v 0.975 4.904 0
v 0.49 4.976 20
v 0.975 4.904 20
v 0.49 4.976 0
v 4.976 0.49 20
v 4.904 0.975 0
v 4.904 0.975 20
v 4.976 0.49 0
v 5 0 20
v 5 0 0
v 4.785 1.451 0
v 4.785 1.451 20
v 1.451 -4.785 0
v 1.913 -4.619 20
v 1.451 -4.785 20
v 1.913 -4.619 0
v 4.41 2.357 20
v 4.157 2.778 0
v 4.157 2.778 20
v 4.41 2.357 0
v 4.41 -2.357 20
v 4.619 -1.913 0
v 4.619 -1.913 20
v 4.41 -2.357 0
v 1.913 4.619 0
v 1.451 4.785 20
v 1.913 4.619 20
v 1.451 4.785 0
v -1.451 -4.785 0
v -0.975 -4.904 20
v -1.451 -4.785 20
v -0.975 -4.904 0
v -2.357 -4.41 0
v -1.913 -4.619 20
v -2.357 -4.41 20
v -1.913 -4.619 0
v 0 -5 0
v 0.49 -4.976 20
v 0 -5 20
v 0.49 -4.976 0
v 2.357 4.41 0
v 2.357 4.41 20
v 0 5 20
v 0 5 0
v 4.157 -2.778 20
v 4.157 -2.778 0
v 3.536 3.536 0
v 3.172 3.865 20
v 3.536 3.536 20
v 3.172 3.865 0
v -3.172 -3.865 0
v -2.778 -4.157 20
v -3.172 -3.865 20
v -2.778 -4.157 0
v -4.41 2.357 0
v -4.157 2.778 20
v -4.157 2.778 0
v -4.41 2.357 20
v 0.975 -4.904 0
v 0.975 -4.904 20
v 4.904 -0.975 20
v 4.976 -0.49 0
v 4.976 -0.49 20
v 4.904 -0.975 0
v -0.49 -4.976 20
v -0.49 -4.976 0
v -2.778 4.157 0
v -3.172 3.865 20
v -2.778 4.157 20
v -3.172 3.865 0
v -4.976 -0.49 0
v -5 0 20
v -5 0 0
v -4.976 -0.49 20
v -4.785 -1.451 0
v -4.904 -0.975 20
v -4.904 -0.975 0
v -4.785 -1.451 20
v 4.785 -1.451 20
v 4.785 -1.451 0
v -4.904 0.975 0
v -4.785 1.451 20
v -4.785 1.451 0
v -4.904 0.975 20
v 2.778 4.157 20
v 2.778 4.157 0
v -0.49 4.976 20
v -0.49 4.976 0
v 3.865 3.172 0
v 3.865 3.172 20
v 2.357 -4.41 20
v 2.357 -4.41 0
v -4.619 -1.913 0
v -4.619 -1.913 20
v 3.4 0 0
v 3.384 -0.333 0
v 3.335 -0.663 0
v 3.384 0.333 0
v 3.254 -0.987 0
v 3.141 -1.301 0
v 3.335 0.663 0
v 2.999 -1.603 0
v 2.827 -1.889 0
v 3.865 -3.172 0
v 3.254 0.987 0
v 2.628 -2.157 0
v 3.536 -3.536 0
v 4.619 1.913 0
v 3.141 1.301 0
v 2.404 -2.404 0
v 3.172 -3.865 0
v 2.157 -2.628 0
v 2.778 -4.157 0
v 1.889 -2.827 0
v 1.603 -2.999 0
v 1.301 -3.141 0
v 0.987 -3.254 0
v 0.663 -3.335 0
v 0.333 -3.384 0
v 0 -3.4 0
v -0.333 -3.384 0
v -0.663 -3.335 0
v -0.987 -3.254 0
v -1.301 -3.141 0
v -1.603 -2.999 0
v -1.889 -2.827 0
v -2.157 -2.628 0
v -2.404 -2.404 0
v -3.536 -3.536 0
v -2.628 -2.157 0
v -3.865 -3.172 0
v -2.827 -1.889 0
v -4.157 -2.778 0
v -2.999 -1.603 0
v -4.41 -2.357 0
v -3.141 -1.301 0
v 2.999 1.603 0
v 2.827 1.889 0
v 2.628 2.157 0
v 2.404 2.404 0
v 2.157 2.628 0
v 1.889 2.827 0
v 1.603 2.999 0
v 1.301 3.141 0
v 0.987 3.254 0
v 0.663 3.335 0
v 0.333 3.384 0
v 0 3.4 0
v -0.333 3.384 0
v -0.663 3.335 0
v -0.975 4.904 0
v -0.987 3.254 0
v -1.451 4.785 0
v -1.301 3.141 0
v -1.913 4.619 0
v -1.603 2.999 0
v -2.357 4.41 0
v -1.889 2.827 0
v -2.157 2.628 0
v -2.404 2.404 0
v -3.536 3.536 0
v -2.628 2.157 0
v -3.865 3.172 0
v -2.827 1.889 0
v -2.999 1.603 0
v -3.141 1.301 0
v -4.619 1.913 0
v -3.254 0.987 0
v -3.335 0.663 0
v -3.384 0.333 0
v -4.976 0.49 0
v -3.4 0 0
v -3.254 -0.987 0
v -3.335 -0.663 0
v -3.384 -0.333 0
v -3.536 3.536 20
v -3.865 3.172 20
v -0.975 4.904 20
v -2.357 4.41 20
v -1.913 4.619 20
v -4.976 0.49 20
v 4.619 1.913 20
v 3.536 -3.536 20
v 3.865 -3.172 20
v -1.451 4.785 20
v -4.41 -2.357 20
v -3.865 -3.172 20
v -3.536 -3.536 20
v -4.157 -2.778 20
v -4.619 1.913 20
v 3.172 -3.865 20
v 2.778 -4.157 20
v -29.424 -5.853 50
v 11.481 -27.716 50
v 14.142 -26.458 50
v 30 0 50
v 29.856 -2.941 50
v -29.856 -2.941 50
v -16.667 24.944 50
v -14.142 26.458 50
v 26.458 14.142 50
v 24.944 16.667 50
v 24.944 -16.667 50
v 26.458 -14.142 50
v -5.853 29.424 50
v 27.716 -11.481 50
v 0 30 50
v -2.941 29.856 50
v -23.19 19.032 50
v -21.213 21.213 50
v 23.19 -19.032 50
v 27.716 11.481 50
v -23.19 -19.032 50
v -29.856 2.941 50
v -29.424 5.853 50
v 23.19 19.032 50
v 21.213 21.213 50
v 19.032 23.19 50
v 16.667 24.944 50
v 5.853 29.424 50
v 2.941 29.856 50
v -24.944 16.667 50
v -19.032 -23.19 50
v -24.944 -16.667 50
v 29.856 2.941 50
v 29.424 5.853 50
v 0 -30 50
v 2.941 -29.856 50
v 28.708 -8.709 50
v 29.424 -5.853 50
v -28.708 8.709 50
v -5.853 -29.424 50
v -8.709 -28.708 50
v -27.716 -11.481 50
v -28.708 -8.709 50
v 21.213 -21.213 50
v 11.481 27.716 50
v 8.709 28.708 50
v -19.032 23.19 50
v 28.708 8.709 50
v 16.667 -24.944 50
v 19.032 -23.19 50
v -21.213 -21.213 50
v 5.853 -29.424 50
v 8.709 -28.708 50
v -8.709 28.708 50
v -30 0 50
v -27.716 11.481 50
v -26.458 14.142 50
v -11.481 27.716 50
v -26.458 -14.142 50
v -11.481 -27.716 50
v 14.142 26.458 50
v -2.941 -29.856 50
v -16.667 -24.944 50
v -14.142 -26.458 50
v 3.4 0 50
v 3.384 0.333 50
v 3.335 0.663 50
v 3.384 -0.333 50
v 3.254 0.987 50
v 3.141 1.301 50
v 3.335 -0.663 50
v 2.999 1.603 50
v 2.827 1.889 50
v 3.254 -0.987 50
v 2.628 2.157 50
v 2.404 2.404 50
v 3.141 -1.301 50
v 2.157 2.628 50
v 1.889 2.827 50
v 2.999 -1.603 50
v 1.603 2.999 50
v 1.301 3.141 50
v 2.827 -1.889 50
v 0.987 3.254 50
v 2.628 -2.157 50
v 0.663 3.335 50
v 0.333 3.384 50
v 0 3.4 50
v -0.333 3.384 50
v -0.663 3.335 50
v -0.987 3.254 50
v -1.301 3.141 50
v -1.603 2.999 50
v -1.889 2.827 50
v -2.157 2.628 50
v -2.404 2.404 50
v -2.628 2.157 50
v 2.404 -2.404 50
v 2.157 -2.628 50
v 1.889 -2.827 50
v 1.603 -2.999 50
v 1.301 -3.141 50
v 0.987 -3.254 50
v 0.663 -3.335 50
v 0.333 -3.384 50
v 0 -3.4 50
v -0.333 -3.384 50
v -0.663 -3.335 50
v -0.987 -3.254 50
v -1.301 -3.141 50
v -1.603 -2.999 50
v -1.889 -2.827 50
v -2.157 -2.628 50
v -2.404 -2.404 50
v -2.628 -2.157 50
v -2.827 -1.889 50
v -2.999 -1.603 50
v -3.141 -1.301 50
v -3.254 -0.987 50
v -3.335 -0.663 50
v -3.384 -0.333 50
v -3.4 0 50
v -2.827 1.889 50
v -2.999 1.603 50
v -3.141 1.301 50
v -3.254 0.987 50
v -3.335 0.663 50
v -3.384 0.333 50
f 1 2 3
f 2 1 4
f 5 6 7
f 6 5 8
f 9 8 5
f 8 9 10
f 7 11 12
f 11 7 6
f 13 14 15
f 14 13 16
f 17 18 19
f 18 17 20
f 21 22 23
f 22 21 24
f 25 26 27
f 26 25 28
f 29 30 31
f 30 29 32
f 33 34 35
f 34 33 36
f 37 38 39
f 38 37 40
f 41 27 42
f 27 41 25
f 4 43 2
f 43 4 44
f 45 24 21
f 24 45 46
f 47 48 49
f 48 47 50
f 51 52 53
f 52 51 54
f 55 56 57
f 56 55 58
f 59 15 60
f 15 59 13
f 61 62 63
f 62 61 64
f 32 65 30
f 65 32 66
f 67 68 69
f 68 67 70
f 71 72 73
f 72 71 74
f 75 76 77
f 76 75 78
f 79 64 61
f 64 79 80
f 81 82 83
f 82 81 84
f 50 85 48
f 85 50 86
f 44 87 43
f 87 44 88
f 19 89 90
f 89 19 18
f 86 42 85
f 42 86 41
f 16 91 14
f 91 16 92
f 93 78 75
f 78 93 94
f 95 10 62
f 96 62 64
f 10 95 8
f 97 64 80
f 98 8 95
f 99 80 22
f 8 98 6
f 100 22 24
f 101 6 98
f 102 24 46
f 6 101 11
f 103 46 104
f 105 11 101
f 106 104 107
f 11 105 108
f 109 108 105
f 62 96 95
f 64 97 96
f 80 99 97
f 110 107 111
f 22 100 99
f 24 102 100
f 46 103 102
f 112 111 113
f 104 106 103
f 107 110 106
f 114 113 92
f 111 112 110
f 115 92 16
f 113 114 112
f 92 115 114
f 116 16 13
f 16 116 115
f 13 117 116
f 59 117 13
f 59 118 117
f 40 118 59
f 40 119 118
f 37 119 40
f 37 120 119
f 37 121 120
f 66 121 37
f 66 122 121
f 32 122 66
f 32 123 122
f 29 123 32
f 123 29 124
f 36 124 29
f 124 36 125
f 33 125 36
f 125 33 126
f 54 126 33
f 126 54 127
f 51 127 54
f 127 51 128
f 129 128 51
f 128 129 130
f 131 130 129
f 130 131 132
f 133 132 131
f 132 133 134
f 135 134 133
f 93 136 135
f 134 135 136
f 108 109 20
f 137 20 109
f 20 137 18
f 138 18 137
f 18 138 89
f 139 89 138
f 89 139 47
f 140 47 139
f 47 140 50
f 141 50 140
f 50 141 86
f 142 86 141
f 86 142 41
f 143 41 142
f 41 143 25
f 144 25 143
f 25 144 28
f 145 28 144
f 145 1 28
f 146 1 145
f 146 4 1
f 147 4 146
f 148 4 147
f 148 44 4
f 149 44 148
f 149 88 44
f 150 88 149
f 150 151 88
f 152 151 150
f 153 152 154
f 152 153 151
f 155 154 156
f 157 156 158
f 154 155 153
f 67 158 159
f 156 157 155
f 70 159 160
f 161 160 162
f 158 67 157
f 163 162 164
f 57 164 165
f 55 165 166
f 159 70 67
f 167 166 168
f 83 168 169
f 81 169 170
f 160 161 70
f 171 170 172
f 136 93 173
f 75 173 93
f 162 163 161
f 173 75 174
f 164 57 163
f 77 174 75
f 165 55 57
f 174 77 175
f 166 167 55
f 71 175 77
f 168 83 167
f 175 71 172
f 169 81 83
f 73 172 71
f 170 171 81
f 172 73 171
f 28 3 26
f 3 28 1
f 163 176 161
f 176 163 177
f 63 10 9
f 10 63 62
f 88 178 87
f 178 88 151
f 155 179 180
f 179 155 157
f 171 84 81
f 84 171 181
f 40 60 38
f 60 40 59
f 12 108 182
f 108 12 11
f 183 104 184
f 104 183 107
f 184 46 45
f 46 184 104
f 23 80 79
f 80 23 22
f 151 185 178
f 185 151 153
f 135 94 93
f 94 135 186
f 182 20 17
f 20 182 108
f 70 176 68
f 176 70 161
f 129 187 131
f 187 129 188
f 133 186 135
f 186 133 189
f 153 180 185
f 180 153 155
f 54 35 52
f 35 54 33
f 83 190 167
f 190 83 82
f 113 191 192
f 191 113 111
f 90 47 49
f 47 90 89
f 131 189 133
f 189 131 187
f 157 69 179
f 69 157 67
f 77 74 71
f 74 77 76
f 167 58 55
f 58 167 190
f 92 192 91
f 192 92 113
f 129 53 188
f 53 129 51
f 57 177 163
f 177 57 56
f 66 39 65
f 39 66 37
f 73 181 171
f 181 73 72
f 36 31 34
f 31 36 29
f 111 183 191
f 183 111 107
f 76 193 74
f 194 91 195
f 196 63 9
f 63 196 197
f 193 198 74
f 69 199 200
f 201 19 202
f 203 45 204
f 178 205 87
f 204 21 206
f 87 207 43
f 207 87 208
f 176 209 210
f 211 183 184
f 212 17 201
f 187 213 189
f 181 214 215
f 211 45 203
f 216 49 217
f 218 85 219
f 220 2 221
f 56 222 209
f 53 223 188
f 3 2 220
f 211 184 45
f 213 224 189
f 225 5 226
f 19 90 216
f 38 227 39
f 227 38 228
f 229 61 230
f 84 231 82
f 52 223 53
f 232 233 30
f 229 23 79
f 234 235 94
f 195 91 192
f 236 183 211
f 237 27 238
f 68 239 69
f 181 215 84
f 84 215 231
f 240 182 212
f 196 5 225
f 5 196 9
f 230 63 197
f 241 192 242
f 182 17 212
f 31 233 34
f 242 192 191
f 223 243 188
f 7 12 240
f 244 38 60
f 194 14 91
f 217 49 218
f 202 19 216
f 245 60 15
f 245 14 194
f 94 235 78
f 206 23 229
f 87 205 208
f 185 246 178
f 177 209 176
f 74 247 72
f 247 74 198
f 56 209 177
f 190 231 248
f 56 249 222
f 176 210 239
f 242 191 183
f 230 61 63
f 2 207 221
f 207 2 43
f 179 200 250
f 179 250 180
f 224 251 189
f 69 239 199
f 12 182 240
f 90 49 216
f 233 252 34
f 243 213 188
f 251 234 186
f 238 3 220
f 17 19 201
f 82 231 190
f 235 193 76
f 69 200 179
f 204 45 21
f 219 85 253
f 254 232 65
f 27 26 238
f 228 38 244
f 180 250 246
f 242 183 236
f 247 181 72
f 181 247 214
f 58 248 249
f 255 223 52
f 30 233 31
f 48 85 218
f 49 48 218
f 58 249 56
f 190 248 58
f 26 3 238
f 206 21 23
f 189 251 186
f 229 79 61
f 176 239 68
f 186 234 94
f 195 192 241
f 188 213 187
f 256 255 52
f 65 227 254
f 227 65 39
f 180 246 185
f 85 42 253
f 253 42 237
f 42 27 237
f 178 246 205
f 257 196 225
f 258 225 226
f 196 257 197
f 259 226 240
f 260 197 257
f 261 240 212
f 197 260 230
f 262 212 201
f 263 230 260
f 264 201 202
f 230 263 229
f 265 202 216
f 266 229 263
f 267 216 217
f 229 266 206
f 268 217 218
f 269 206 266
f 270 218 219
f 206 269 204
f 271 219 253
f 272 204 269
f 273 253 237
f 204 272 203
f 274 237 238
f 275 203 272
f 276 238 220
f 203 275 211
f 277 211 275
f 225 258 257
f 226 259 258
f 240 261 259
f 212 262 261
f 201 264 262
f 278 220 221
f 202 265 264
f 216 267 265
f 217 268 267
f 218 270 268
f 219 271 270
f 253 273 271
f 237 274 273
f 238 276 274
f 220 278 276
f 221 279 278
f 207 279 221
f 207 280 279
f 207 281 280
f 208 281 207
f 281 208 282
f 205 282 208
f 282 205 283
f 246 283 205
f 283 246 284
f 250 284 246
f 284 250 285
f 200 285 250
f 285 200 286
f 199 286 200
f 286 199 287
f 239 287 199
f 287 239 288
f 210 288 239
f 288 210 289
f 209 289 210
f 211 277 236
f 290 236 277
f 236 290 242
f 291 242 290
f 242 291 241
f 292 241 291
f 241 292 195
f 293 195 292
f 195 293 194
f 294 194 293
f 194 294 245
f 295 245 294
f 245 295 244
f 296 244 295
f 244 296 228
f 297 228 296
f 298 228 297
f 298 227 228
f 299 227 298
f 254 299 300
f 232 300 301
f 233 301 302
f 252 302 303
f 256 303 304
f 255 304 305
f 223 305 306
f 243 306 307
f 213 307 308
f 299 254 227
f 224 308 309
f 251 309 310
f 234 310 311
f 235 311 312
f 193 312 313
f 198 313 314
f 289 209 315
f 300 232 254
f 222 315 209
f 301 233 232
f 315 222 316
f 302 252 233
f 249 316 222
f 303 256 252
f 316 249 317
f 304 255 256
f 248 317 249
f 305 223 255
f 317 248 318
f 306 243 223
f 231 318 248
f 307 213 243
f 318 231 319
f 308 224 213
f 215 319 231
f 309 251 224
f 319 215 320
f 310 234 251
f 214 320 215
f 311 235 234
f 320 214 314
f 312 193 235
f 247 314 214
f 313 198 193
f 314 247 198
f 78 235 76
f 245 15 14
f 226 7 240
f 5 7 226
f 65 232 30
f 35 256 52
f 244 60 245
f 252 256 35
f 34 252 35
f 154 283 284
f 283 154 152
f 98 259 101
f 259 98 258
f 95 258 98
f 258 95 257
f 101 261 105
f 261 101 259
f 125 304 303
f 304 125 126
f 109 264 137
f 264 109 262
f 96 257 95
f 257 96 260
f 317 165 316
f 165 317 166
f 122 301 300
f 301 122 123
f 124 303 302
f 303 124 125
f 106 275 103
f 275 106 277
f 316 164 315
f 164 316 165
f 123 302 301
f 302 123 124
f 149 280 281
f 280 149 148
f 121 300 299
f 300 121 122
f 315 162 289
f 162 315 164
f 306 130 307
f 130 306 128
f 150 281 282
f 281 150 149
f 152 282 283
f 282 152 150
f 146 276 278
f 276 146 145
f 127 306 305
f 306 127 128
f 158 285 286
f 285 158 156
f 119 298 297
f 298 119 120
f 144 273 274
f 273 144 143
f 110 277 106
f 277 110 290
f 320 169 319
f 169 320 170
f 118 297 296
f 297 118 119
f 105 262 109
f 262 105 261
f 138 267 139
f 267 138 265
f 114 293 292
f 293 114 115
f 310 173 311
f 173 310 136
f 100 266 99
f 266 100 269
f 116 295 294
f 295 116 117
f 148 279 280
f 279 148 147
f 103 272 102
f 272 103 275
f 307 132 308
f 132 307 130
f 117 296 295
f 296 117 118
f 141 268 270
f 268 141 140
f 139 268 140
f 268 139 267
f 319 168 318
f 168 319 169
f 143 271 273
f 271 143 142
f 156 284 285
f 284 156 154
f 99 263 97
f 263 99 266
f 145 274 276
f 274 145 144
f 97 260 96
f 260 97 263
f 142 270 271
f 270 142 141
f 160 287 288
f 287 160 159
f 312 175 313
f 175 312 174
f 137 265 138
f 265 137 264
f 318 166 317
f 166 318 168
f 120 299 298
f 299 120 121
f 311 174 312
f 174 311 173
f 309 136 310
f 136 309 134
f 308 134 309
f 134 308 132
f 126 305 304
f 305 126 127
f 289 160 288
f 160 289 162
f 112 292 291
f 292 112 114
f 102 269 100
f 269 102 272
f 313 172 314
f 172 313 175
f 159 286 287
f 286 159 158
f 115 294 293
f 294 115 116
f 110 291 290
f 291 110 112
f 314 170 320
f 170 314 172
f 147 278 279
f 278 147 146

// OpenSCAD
// Small lab funnel – printed upright, wide opening at top, straight through bore.
// All dimensions in millimetres.

// ---- Named dimensions (measured with calipers) ----
spout_od   = 10.0;   // spout outer diameter
spout_h    = 20.0;   // spout height (z = 0 to z = 20)
cone_od    = 60.0;   // cone outer diameter at the rim (z = 50)
cone_h     = 30.0;   // cone height (z = 20 to z = 50)
wall       = 1.6;    // uniform wall thickness
bore_d     = spout_od - 2*wall;   // 6.8 mm straight bore
total_h    = spout_h + cone_h;    // 50 mm overall height

$fn = 64;            // smooth round holes / rims

// ---- Outer solid: straight spout + widening cone ----
module outer() { union() {
    // Straight spout, z = 0 to z = 20
    translate([0, 0, 0])
        cylinder(h = spout_h, d = spout_od, center = false);

    // Cone, z = 20 to z = 50 (10 mm OD -> 60 mm OD)
    translate([0, 0, spout_h])
        cylinder(h = cone_h, d1 = spout_od, d2 = cone_od, center = false);
} }

// ---- Bore: straight 6.8 mm tube running the full height, open top & bottom.
//      Extended 1 mm past each face so the cut is clean (no coplanar faces). ----
module bore() { translate([0, 0, -1])
    cylinder(h = total_h + 2, d = bore_d, center = false); }

// ---- Final funnel: outer solid minus the through-bore ----
difference() {
    outer();
    bore();
}
